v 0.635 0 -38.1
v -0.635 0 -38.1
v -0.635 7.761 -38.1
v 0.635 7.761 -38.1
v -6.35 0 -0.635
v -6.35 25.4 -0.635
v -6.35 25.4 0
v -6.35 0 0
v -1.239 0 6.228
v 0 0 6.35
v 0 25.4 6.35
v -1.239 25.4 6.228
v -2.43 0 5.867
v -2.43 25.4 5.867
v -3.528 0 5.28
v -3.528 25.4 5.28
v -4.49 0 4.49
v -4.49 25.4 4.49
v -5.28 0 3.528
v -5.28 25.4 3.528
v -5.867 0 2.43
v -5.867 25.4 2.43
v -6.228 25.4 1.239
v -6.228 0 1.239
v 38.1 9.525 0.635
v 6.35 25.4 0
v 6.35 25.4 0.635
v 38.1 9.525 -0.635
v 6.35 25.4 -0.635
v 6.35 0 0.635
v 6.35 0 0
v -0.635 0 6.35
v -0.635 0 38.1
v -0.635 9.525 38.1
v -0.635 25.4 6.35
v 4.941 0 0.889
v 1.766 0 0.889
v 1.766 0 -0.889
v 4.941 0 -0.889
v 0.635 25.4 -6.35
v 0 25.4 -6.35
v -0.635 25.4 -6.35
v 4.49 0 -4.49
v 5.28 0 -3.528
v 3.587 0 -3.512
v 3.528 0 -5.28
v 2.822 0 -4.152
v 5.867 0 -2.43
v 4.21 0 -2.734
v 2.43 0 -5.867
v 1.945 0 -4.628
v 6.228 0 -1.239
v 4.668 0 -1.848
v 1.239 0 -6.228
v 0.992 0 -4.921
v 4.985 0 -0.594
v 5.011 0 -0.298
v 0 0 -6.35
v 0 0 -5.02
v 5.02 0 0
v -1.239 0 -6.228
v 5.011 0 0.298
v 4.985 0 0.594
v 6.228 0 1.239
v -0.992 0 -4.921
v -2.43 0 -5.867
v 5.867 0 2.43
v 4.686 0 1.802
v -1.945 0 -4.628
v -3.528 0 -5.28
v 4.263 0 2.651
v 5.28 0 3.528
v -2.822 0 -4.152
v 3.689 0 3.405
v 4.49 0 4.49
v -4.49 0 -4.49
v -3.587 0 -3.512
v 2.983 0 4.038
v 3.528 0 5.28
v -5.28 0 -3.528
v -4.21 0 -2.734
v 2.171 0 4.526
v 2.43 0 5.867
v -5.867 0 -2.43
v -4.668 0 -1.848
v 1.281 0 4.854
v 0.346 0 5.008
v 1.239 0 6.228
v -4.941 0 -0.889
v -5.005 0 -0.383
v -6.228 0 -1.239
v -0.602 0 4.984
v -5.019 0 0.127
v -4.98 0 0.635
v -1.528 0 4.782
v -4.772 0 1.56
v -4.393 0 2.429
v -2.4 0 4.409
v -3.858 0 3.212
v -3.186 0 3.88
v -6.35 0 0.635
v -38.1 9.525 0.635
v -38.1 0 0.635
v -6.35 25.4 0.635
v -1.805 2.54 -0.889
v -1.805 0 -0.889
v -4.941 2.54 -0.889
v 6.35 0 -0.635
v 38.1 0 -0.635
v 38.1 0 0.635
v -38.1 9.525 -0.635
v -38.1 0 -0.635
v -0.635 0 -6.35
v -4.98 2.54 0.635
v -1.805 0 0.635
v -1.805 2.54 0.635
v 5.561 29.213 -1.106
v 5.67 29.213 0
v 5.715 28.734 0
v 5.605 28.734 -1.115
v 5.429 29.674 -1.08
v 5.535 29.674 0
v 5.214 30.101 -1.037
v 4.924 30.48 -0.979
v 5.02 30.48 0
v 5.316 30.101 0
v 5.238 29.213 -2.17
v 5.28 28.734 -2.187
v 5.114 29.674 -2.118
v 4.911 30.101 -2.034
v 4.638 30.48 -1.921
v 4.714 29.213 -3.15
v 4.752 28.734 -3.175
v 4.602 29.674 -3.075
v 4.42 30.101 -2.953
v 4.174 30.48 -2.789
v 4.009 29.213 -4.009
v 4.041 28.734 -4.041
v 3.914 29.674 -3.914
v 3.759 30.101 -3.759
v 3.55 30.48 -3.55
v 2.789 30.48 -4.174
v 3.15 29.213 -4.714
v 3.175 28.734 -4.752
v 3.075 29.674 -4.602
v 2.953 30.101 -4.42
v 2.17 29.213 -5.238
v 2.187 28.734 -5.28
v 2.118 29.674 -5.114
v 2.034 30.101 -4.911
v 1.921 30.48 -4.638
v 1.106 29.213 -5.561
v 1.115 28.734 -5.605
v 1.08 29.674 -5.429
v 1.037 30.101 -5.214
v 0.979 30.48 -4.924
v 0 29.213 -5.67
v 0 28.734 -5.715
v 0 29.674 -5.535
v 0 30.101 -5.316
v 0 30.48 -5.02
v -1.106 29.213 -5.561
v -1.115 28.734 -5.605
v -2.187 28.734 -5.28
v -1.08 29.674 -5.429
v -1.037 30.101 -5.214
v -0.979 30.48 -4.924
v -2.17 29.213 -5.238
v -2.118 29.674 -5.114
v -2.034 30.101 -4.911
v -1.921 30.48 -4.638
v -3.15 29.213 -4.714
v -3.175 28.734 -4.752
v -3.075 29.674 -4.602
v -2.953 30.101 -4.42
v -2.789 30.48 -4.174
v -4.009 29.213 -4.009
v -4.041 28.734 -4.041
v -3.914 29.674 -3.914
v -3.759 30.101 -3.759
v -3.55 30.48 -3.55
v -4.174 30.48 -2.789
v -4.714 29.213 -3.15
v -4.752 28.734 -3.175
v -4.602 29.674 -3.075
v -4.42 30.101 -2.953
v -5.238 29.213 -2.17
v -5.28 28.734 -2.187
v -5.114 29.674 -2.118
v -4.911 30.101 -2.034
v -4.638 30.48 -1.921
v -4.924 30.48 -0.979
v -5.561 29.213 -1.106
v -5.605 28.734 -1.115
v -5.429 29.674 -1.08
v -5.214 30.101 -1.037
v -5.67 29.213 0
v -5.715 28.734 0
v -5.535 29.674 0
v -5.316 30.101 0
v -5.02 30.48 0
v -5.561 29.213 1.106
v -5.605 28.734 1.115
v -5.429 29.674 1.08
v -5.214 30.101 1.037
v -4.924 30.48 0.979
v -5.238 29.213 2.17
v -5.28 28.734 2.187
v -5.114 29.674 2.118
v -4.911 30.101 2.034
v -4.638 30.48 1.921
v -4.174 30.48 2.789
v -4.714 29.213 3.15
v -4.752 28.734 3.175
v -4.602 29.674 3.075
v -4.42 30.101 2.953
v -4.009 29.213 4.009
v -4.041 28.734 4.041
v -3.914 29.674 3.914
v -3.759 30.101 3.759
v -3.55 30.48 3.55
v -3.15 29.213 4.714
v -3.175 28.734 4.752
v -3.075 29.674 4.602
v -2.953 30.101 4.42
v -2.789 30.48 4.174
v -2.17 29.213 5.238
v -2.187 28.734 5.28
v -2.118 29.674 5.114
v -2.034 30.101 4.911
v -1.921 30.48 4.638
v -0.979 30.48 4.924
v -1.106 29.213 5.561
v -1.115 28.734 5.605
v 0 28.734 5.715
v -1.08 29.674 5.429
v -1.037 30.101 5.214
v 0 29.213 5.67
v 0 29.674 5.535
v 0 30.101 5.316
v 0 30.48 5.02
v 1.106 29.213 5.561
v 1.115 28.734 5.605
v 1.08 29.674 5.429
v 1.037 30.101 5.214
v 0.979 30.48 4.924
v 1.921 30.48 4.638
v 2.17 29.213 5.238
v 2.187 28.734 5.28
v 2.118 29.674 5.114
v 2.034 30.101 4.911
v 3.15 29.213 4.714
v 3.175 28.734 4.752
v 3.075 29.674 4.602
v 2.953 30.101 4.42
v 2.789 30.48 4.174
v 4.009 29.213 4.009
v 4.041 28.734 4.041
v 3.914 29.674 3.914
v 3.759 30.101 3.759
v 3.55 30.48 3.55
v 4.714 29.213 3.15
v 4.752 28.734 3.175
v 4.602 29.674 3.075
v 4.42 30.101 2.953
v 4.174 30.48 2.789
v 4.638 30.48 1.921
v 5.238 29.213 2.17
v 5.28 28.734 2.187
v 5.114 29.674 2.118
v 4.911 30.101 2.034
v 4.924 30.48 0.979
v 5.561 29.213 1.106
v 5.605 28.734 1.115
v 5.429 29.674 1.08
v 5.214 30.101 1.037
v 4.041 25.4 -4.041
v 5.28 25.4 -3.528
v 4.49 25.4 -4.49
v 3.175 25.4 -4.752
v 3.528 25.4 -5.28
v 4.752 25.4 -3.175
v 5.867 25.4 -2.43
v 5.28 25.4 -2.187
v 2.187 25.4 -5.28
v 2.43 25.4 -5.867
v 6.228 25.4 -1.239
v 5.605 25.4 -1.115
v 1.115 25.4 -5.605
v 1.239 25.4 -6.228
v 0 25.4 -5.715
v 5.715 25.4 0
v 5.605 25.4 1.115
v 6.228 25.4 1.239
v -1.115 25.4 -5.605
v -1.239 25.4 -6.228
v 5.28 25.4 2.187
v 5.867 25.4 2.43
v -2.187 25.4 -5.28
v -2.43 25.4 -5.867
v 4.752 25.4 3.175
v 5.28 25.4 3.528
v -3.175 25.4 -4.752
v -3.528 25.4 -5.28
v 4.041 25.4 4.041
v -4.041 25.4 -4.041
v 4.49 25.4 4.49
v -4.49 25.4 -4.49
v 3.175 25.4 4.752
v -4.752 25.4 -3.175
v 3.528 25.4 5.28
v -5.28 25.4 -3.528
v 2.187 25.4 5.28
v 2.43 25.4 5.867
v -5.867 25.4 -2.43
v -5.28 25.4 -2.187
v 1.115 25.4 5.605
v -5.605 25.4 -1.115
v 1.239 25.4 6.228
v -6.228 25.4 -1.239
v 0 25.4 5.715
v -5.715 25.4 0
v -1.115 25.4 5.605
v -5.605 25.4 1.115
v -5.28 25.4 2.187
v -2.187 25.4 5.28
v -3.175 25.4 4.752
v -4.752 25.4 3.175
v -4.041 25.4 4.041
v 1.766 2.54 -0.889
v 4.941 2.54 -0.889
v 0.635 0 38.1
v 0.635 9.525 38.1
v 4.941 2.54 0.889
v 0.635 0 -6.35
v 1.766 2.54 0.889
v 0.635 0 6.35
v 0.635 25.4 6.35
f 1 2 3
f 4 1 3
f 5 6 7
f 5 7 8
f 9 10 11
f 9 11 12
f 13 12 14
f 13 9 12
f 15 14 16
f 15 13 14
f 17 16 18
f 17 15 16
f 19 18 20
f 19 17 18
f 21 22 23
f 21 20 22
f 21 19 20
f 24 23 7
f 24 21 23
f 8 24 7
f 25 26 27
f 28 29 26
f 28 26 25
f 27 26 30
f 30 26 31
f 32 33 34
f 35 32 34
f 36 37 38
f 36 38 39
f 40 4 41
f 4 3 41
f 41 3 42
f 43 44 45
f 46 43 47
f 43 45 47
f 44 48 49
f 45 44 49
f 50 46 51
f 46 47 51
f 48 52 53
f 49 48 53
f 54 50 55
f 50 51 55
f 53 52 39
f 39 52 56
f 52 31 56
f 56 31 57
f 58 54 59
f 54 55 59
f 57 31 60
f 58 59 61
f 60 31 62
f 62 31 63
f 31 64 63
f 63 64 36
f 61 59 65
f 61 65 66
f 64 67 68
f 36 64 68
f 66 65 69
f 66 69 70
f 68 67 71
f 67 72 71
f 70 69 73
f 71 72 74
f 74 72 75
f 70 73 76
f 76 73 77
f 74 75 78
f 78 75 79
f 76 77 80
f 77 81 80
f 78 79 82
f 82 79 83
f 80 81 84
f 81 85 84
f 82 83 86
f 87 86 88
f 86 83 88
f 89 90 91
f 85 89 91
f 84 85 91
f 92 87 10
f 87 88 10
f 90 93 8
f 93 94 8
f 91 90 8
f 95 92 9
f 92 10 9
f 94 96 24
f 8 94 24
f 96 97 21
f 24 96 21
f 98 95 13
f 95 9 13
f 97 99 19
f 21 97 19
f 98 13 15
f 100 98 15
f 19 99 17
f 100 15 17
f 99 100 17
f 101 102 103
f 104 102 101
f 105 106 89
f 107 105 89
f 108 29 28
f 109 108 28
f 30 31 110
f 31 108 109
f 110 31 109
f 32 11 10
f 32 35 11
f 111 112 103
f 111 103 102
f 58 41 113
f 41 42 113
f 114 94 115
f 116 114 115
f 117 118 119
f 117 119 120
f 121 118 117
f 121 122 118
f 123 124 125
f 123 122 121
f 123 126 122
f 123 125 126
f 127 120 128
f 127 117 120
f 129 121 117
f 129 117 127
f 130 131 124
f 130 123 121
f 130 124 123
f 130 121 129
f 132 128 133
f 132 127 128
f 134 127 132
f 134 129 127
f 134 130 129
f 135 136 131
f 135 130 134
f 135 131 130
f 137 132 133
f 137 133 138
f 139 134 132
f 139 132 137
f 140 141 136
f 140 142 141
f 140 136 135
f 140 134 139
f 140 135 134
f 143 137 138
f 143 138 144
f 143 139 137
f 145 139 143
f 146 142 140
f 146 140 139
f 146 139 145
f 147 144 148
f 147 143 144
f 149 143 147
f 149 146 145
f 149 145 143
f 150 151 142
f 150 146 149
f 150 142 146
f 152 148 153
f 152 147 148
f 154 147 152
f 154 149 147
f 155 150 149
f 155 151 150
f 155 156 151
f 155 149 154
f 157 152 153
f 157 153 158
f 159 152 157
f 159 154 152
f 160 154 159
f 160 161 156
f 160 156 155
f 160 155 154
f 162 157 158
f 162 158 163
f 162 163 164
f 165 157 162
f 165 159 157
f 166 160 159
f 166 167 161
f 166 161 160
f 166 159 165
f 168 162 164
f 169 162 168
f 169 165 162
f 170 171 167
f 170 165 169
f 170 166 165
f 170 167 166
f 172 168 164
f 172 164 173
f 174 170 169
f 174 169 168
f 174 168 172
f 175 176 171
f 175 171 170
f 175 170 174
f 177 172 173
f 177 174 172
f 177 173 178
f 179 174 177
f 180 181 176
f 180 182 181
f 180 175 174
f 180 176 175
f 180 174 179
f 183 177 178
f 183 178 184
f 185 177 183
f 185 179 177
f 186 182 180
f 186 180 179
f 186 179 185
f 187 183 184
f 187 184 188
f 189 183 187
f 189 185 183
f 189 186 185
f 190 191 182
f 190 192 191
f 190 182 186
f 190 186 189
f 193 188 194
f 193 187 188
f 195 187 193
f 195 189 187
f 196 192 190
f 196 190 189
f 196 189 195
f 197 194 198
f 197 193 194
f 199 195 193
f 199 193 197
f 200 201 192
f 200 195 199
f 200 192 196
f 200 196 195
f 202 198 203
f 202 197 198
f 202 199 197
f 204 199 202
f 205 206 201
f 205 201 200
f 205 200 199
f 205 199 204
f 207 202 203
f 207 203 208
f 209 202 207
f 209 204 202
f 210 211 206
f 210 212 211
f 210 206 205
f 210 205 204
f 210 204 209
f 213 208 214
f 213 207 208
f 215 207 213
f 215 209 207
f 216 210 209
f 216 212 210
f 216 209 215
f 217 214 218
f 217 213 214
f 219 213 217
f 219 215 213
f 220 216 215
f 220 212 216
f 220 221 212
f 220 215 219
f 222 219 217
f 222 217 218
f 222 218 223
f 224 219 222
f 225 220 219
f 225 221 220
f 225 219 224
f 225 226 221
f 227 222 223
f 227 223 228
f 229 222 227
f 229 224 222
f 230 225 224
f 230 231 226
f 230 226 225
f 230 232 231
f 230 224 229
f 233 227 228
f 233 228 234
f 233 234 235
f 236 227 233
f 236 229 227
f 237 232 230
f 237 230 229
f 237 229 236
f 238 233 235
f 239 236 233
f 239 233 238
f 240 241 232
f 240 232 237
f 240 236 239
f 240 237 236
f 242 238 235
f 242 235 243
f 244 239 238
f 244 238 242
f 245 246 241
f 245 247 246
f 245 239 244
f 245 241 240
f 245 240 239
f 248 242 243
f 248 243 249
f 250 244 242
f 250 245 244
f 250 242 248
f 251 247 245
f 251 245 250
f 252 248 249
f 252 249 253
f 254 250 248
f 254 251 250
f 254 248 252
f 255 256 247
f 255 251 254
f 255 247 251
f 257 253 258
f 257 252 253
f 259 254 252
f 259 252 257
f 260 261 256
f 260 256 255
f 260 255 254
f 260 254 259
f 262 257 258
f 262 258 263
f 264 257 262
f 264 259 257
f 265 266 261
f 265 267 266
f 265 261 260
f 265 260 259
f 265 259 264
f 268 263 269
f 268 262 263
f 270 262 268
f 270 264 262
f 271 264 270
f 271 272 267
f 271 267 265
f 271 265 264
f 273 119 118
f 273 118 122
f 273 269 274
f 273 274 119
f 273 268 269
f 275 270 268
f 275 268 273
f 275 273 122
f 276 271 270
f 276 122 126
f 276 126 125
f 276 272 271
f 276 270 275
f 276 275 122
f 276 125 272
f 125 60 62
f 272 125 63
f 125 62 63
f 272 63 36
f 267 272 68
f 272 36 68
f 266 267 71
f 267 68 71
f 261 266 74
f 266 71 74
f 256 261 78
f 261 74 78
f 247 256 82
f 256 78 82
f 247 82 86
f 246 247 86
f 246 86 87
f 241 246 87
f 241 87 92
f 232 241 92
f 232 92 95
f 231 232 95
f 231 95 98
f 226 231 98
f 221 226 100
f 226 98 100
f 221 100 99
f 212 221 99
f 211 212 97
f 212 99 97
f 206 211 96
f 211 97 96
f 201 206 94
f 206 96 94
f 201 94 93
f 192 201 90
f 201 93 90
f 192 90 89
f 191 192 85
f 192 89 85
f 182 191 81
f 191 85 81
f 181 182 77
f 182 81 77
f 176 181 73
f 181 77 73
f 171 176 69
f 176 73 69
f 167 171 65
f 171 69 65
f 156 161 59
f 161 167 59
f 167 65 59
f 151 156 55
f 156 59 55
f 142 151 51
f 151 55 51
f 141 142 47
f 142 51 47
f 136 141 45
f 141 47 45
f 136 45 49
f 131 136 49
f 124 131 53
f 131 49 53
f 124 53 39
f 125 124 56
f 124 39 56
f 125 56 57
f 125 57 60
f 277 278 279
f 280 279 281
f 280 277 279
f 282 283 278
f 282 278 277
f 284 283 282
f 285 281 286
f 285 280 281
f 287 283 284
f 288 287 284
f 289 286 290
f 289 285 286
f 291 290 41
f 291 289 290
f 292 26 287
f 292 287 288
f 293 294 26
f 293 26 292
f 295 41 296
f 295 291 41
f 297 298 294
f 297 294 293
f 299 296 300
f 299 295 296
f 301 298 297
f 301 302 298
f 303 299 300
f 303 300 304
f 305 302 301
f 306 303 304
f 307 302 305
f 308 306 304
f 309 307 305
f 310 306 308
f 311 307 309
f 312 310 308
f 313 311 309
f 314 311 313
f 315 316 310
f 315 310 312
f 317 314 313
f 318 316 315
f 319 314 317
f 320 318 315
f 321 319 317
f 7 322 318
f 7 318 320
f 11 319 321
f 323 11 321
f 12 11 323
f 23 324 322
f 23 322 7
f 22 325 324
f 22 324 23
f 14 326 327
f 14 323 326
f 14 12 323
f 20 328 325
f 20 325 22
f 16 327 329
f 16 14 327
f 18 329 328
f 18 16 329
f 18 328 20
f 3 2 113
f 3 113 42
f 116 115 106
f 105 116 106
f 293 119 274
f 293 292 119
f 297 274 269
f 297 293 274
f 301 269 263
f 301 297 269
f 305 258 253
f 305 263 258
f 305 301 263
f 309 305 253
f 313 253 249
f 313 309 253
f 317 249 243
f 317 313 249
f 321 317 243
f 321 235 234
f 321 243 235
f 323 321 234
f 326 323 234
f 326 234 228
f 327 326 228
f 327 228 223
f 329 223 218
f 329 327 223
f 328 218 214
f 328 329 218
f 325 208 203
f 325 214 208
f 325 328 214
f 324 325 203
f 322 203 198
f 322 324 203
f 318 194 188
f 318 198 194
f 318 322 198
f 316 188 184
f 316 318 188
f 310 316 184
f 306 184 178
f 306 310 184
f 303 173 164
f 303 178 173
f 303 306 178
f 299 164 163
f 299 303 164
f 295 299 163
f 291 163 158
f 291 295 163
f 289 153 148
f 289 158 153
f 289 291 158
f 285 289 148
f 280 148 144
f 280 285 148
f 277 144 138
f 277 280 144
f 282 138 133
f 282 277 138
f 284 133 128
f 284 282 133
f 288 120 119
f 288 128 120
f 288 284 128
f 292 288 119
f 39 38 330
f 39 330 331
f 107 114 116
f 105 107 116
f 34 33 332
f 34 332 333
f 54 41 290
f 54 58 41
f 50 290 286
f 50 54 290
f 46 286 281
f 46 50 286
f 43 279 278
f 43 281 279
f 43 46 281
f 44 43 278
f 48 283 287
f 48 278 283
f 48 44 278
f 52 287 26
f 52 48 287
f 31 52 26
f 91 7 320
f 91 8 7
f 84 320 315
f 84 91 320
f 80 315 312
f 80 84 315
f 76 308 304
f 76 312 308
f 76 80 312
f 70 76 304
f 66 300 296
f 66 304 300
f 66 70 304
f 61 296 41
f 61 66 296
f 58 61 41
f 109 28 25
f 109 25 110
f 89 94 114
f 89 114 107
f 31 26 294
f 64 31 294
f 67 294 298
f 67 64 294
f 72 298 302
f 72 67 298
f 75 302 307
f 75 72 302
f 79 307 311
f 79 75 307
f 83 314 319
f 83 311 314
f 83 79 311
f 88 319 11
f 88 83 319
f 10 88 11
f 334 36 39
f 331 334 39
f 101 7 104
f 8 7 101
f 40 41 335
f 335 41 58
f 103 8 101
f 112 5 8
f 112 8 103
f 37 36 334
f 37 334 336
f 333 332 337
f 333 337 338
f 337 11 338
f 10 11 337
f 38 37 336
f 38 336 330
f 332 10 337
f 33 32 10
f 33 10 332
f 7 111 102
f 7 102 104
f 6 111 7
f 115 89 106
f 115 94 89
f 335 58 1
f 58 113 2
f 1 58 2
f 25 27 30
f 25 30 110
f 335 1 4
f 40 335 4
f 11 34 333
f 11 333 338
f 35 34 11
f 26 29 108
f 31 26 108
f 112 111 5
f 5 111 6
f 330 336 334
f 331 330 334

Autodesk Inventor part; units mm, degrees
ref_plane "YZ Plane" through (0, 0, 0) normal (1, 0, 0) x (0, 1, 0)
ref_plane "XZ Plane" through (0, 0, 0) normal (0, 1, 0) x (-1, 0, 0)
ref_plane "XY Plane" through (0, 0, 0) normal (0, 0, 1) x (1, 0, 0)
sketch "Sketch1" plane through (0, 0, 0) normal (0, 1, 0) x (-1, 0, 0)
  circle A0 centre (0, 0) radius 6.35
  dimension "d0" = 12.7
extrude "Extrusion1" add sketch "Sketch1" along normal blind 25.4
sketch "Sketch2" plane through (0, 25.4, 0) normal (0, 1, 0) x (1, 0, 0)
  circle A0 centre (0, 0) radius 5.715
  circle A1 centre (0, 0) radius 5.0201
  dimension "d3" = 11.43
extrude "Extrusion2" cut sketch "Sketch2" against normal blind 25.4 contours A1
extrude "Extrusion3" add sketch "Sketch2" along normal blind 5.08
fillet "Fillet1" radius 2.54 1 edges at (-5.715, 30.48, 0)
sketch "Sketch3" plane through (0, 0, 0) normal (0, 1, 0) x (-1, 0, 0)
  point P0 (0, 0)
sketch "Sketch4" plane through (0, 0, 0) normal (0, 0, 1) x (1, 0, 0)
  line L0 (-6.35, 0) -> (6.35, 0) projected
  line L1 (6.35, 0) -> (38.1, 0)
  line L2 (-6.35, 0) -> (-38.1, 0)
  line L3 (-38.1, 0) -> (-38.1, 9.525)
  line L4 (6.35, 25.4) -> (-6.35, 25.4) projected
  line L5 (-38.1, 9.525) -> (-6.35, 25.4)
  line L6 (-6.35, 25.4) -> (-6.35, 0)
  line L7 (6.35, 25.4) -> (6.35, 0)
  line L8 (6.35, 25.4) -> (38.1, 9.525)
  line L9 (38.1, 9.525) -> (38.1, 0)
  point P0 (0, 0)
  dimension "d9" = 31.75
  dimension "d10" = 31.75
extrude "Extrusion4" add sketch "Sketch4" along normal mid plane 1.27 contours L2 L3 L5 L6 | L7 L8 L9 L1
sketch "Sketch5" plane through (0, 0, 0) normal (1, 0, 0) x (0, 1, 0)
  line L0 (0, -6.35) -> (0, -38.1)
  line L1 (0, -38.1) -> (7.7611, -38.1)
  line L2 (25.4, -6.35) -> (25.4, 0) projected
  line L3 (7.7611, -38.1) -> (25.4, -6.35)
  line L4 (25.4, -6.35) -> (0, -6.35)
  line L5 (0, -6.35) -> (25.4, -6.35) projected
  line L6 (0, 6.35) -> (0, 38.1)
  line L7 (0, 38.1) -> (9.525, 38.1)
  line L8 (25.4, 0) -> (25.4, 6.35) projected
  line L9 (9.525, 38.1) -> (25.4, 6.35)
  line L10 (25.4, 6.35) -> (0, 6.35)
  point P0 (0, 0)
  dimension "d15" = 31.75
  dimension "d16" = 31.75
extrude "Extrusion5" add sketch "Sketch5" along normal mid plane 1.27
sketch "Sketch6" plane through (0, 0, 0) normal (0, -1, 0) x (1, 0, 0)
  circle A0 centre (0, 0) radius 5.0201 projected
  line L0 (-4.9798, 0.635) -> (-1.8048, 0.635)
  line L1 (-6.35, 0.635) -> (-38.1, 0.635) projected
  line L2 (-1.8048, 0.635) -> (-1.8048, -0.889)
  line L3 (-1.8048, -0.889) -> (-4.9408, -0.889)
  spline S0 degree 1 poles (-4.9798, 0.635) (-4.9408, -0.889) knots 0 0 1 1
  line L4 (4.9408, 0.889) -> (1.7658, 0.889)
  line L5 (1.7658, 0.889) -> (1.7658, -0.889)
  line L6 (1.7658, -0.889) -> (4.9408, -0.889)
  line L7 (4.9408, 0.889) -> (4.9408, -0.889)
  dimension "d17" = 3.175
  dimension "d18" = 1.524
  dimension "d19" = 3.175
extrude "Extrusion6" add sketch "Sketch6" against normal blind 2.54 contours L7 L6 L5 L4 | L0 L2 L3 S0
properties part number "Rocket - Base Assembled"
